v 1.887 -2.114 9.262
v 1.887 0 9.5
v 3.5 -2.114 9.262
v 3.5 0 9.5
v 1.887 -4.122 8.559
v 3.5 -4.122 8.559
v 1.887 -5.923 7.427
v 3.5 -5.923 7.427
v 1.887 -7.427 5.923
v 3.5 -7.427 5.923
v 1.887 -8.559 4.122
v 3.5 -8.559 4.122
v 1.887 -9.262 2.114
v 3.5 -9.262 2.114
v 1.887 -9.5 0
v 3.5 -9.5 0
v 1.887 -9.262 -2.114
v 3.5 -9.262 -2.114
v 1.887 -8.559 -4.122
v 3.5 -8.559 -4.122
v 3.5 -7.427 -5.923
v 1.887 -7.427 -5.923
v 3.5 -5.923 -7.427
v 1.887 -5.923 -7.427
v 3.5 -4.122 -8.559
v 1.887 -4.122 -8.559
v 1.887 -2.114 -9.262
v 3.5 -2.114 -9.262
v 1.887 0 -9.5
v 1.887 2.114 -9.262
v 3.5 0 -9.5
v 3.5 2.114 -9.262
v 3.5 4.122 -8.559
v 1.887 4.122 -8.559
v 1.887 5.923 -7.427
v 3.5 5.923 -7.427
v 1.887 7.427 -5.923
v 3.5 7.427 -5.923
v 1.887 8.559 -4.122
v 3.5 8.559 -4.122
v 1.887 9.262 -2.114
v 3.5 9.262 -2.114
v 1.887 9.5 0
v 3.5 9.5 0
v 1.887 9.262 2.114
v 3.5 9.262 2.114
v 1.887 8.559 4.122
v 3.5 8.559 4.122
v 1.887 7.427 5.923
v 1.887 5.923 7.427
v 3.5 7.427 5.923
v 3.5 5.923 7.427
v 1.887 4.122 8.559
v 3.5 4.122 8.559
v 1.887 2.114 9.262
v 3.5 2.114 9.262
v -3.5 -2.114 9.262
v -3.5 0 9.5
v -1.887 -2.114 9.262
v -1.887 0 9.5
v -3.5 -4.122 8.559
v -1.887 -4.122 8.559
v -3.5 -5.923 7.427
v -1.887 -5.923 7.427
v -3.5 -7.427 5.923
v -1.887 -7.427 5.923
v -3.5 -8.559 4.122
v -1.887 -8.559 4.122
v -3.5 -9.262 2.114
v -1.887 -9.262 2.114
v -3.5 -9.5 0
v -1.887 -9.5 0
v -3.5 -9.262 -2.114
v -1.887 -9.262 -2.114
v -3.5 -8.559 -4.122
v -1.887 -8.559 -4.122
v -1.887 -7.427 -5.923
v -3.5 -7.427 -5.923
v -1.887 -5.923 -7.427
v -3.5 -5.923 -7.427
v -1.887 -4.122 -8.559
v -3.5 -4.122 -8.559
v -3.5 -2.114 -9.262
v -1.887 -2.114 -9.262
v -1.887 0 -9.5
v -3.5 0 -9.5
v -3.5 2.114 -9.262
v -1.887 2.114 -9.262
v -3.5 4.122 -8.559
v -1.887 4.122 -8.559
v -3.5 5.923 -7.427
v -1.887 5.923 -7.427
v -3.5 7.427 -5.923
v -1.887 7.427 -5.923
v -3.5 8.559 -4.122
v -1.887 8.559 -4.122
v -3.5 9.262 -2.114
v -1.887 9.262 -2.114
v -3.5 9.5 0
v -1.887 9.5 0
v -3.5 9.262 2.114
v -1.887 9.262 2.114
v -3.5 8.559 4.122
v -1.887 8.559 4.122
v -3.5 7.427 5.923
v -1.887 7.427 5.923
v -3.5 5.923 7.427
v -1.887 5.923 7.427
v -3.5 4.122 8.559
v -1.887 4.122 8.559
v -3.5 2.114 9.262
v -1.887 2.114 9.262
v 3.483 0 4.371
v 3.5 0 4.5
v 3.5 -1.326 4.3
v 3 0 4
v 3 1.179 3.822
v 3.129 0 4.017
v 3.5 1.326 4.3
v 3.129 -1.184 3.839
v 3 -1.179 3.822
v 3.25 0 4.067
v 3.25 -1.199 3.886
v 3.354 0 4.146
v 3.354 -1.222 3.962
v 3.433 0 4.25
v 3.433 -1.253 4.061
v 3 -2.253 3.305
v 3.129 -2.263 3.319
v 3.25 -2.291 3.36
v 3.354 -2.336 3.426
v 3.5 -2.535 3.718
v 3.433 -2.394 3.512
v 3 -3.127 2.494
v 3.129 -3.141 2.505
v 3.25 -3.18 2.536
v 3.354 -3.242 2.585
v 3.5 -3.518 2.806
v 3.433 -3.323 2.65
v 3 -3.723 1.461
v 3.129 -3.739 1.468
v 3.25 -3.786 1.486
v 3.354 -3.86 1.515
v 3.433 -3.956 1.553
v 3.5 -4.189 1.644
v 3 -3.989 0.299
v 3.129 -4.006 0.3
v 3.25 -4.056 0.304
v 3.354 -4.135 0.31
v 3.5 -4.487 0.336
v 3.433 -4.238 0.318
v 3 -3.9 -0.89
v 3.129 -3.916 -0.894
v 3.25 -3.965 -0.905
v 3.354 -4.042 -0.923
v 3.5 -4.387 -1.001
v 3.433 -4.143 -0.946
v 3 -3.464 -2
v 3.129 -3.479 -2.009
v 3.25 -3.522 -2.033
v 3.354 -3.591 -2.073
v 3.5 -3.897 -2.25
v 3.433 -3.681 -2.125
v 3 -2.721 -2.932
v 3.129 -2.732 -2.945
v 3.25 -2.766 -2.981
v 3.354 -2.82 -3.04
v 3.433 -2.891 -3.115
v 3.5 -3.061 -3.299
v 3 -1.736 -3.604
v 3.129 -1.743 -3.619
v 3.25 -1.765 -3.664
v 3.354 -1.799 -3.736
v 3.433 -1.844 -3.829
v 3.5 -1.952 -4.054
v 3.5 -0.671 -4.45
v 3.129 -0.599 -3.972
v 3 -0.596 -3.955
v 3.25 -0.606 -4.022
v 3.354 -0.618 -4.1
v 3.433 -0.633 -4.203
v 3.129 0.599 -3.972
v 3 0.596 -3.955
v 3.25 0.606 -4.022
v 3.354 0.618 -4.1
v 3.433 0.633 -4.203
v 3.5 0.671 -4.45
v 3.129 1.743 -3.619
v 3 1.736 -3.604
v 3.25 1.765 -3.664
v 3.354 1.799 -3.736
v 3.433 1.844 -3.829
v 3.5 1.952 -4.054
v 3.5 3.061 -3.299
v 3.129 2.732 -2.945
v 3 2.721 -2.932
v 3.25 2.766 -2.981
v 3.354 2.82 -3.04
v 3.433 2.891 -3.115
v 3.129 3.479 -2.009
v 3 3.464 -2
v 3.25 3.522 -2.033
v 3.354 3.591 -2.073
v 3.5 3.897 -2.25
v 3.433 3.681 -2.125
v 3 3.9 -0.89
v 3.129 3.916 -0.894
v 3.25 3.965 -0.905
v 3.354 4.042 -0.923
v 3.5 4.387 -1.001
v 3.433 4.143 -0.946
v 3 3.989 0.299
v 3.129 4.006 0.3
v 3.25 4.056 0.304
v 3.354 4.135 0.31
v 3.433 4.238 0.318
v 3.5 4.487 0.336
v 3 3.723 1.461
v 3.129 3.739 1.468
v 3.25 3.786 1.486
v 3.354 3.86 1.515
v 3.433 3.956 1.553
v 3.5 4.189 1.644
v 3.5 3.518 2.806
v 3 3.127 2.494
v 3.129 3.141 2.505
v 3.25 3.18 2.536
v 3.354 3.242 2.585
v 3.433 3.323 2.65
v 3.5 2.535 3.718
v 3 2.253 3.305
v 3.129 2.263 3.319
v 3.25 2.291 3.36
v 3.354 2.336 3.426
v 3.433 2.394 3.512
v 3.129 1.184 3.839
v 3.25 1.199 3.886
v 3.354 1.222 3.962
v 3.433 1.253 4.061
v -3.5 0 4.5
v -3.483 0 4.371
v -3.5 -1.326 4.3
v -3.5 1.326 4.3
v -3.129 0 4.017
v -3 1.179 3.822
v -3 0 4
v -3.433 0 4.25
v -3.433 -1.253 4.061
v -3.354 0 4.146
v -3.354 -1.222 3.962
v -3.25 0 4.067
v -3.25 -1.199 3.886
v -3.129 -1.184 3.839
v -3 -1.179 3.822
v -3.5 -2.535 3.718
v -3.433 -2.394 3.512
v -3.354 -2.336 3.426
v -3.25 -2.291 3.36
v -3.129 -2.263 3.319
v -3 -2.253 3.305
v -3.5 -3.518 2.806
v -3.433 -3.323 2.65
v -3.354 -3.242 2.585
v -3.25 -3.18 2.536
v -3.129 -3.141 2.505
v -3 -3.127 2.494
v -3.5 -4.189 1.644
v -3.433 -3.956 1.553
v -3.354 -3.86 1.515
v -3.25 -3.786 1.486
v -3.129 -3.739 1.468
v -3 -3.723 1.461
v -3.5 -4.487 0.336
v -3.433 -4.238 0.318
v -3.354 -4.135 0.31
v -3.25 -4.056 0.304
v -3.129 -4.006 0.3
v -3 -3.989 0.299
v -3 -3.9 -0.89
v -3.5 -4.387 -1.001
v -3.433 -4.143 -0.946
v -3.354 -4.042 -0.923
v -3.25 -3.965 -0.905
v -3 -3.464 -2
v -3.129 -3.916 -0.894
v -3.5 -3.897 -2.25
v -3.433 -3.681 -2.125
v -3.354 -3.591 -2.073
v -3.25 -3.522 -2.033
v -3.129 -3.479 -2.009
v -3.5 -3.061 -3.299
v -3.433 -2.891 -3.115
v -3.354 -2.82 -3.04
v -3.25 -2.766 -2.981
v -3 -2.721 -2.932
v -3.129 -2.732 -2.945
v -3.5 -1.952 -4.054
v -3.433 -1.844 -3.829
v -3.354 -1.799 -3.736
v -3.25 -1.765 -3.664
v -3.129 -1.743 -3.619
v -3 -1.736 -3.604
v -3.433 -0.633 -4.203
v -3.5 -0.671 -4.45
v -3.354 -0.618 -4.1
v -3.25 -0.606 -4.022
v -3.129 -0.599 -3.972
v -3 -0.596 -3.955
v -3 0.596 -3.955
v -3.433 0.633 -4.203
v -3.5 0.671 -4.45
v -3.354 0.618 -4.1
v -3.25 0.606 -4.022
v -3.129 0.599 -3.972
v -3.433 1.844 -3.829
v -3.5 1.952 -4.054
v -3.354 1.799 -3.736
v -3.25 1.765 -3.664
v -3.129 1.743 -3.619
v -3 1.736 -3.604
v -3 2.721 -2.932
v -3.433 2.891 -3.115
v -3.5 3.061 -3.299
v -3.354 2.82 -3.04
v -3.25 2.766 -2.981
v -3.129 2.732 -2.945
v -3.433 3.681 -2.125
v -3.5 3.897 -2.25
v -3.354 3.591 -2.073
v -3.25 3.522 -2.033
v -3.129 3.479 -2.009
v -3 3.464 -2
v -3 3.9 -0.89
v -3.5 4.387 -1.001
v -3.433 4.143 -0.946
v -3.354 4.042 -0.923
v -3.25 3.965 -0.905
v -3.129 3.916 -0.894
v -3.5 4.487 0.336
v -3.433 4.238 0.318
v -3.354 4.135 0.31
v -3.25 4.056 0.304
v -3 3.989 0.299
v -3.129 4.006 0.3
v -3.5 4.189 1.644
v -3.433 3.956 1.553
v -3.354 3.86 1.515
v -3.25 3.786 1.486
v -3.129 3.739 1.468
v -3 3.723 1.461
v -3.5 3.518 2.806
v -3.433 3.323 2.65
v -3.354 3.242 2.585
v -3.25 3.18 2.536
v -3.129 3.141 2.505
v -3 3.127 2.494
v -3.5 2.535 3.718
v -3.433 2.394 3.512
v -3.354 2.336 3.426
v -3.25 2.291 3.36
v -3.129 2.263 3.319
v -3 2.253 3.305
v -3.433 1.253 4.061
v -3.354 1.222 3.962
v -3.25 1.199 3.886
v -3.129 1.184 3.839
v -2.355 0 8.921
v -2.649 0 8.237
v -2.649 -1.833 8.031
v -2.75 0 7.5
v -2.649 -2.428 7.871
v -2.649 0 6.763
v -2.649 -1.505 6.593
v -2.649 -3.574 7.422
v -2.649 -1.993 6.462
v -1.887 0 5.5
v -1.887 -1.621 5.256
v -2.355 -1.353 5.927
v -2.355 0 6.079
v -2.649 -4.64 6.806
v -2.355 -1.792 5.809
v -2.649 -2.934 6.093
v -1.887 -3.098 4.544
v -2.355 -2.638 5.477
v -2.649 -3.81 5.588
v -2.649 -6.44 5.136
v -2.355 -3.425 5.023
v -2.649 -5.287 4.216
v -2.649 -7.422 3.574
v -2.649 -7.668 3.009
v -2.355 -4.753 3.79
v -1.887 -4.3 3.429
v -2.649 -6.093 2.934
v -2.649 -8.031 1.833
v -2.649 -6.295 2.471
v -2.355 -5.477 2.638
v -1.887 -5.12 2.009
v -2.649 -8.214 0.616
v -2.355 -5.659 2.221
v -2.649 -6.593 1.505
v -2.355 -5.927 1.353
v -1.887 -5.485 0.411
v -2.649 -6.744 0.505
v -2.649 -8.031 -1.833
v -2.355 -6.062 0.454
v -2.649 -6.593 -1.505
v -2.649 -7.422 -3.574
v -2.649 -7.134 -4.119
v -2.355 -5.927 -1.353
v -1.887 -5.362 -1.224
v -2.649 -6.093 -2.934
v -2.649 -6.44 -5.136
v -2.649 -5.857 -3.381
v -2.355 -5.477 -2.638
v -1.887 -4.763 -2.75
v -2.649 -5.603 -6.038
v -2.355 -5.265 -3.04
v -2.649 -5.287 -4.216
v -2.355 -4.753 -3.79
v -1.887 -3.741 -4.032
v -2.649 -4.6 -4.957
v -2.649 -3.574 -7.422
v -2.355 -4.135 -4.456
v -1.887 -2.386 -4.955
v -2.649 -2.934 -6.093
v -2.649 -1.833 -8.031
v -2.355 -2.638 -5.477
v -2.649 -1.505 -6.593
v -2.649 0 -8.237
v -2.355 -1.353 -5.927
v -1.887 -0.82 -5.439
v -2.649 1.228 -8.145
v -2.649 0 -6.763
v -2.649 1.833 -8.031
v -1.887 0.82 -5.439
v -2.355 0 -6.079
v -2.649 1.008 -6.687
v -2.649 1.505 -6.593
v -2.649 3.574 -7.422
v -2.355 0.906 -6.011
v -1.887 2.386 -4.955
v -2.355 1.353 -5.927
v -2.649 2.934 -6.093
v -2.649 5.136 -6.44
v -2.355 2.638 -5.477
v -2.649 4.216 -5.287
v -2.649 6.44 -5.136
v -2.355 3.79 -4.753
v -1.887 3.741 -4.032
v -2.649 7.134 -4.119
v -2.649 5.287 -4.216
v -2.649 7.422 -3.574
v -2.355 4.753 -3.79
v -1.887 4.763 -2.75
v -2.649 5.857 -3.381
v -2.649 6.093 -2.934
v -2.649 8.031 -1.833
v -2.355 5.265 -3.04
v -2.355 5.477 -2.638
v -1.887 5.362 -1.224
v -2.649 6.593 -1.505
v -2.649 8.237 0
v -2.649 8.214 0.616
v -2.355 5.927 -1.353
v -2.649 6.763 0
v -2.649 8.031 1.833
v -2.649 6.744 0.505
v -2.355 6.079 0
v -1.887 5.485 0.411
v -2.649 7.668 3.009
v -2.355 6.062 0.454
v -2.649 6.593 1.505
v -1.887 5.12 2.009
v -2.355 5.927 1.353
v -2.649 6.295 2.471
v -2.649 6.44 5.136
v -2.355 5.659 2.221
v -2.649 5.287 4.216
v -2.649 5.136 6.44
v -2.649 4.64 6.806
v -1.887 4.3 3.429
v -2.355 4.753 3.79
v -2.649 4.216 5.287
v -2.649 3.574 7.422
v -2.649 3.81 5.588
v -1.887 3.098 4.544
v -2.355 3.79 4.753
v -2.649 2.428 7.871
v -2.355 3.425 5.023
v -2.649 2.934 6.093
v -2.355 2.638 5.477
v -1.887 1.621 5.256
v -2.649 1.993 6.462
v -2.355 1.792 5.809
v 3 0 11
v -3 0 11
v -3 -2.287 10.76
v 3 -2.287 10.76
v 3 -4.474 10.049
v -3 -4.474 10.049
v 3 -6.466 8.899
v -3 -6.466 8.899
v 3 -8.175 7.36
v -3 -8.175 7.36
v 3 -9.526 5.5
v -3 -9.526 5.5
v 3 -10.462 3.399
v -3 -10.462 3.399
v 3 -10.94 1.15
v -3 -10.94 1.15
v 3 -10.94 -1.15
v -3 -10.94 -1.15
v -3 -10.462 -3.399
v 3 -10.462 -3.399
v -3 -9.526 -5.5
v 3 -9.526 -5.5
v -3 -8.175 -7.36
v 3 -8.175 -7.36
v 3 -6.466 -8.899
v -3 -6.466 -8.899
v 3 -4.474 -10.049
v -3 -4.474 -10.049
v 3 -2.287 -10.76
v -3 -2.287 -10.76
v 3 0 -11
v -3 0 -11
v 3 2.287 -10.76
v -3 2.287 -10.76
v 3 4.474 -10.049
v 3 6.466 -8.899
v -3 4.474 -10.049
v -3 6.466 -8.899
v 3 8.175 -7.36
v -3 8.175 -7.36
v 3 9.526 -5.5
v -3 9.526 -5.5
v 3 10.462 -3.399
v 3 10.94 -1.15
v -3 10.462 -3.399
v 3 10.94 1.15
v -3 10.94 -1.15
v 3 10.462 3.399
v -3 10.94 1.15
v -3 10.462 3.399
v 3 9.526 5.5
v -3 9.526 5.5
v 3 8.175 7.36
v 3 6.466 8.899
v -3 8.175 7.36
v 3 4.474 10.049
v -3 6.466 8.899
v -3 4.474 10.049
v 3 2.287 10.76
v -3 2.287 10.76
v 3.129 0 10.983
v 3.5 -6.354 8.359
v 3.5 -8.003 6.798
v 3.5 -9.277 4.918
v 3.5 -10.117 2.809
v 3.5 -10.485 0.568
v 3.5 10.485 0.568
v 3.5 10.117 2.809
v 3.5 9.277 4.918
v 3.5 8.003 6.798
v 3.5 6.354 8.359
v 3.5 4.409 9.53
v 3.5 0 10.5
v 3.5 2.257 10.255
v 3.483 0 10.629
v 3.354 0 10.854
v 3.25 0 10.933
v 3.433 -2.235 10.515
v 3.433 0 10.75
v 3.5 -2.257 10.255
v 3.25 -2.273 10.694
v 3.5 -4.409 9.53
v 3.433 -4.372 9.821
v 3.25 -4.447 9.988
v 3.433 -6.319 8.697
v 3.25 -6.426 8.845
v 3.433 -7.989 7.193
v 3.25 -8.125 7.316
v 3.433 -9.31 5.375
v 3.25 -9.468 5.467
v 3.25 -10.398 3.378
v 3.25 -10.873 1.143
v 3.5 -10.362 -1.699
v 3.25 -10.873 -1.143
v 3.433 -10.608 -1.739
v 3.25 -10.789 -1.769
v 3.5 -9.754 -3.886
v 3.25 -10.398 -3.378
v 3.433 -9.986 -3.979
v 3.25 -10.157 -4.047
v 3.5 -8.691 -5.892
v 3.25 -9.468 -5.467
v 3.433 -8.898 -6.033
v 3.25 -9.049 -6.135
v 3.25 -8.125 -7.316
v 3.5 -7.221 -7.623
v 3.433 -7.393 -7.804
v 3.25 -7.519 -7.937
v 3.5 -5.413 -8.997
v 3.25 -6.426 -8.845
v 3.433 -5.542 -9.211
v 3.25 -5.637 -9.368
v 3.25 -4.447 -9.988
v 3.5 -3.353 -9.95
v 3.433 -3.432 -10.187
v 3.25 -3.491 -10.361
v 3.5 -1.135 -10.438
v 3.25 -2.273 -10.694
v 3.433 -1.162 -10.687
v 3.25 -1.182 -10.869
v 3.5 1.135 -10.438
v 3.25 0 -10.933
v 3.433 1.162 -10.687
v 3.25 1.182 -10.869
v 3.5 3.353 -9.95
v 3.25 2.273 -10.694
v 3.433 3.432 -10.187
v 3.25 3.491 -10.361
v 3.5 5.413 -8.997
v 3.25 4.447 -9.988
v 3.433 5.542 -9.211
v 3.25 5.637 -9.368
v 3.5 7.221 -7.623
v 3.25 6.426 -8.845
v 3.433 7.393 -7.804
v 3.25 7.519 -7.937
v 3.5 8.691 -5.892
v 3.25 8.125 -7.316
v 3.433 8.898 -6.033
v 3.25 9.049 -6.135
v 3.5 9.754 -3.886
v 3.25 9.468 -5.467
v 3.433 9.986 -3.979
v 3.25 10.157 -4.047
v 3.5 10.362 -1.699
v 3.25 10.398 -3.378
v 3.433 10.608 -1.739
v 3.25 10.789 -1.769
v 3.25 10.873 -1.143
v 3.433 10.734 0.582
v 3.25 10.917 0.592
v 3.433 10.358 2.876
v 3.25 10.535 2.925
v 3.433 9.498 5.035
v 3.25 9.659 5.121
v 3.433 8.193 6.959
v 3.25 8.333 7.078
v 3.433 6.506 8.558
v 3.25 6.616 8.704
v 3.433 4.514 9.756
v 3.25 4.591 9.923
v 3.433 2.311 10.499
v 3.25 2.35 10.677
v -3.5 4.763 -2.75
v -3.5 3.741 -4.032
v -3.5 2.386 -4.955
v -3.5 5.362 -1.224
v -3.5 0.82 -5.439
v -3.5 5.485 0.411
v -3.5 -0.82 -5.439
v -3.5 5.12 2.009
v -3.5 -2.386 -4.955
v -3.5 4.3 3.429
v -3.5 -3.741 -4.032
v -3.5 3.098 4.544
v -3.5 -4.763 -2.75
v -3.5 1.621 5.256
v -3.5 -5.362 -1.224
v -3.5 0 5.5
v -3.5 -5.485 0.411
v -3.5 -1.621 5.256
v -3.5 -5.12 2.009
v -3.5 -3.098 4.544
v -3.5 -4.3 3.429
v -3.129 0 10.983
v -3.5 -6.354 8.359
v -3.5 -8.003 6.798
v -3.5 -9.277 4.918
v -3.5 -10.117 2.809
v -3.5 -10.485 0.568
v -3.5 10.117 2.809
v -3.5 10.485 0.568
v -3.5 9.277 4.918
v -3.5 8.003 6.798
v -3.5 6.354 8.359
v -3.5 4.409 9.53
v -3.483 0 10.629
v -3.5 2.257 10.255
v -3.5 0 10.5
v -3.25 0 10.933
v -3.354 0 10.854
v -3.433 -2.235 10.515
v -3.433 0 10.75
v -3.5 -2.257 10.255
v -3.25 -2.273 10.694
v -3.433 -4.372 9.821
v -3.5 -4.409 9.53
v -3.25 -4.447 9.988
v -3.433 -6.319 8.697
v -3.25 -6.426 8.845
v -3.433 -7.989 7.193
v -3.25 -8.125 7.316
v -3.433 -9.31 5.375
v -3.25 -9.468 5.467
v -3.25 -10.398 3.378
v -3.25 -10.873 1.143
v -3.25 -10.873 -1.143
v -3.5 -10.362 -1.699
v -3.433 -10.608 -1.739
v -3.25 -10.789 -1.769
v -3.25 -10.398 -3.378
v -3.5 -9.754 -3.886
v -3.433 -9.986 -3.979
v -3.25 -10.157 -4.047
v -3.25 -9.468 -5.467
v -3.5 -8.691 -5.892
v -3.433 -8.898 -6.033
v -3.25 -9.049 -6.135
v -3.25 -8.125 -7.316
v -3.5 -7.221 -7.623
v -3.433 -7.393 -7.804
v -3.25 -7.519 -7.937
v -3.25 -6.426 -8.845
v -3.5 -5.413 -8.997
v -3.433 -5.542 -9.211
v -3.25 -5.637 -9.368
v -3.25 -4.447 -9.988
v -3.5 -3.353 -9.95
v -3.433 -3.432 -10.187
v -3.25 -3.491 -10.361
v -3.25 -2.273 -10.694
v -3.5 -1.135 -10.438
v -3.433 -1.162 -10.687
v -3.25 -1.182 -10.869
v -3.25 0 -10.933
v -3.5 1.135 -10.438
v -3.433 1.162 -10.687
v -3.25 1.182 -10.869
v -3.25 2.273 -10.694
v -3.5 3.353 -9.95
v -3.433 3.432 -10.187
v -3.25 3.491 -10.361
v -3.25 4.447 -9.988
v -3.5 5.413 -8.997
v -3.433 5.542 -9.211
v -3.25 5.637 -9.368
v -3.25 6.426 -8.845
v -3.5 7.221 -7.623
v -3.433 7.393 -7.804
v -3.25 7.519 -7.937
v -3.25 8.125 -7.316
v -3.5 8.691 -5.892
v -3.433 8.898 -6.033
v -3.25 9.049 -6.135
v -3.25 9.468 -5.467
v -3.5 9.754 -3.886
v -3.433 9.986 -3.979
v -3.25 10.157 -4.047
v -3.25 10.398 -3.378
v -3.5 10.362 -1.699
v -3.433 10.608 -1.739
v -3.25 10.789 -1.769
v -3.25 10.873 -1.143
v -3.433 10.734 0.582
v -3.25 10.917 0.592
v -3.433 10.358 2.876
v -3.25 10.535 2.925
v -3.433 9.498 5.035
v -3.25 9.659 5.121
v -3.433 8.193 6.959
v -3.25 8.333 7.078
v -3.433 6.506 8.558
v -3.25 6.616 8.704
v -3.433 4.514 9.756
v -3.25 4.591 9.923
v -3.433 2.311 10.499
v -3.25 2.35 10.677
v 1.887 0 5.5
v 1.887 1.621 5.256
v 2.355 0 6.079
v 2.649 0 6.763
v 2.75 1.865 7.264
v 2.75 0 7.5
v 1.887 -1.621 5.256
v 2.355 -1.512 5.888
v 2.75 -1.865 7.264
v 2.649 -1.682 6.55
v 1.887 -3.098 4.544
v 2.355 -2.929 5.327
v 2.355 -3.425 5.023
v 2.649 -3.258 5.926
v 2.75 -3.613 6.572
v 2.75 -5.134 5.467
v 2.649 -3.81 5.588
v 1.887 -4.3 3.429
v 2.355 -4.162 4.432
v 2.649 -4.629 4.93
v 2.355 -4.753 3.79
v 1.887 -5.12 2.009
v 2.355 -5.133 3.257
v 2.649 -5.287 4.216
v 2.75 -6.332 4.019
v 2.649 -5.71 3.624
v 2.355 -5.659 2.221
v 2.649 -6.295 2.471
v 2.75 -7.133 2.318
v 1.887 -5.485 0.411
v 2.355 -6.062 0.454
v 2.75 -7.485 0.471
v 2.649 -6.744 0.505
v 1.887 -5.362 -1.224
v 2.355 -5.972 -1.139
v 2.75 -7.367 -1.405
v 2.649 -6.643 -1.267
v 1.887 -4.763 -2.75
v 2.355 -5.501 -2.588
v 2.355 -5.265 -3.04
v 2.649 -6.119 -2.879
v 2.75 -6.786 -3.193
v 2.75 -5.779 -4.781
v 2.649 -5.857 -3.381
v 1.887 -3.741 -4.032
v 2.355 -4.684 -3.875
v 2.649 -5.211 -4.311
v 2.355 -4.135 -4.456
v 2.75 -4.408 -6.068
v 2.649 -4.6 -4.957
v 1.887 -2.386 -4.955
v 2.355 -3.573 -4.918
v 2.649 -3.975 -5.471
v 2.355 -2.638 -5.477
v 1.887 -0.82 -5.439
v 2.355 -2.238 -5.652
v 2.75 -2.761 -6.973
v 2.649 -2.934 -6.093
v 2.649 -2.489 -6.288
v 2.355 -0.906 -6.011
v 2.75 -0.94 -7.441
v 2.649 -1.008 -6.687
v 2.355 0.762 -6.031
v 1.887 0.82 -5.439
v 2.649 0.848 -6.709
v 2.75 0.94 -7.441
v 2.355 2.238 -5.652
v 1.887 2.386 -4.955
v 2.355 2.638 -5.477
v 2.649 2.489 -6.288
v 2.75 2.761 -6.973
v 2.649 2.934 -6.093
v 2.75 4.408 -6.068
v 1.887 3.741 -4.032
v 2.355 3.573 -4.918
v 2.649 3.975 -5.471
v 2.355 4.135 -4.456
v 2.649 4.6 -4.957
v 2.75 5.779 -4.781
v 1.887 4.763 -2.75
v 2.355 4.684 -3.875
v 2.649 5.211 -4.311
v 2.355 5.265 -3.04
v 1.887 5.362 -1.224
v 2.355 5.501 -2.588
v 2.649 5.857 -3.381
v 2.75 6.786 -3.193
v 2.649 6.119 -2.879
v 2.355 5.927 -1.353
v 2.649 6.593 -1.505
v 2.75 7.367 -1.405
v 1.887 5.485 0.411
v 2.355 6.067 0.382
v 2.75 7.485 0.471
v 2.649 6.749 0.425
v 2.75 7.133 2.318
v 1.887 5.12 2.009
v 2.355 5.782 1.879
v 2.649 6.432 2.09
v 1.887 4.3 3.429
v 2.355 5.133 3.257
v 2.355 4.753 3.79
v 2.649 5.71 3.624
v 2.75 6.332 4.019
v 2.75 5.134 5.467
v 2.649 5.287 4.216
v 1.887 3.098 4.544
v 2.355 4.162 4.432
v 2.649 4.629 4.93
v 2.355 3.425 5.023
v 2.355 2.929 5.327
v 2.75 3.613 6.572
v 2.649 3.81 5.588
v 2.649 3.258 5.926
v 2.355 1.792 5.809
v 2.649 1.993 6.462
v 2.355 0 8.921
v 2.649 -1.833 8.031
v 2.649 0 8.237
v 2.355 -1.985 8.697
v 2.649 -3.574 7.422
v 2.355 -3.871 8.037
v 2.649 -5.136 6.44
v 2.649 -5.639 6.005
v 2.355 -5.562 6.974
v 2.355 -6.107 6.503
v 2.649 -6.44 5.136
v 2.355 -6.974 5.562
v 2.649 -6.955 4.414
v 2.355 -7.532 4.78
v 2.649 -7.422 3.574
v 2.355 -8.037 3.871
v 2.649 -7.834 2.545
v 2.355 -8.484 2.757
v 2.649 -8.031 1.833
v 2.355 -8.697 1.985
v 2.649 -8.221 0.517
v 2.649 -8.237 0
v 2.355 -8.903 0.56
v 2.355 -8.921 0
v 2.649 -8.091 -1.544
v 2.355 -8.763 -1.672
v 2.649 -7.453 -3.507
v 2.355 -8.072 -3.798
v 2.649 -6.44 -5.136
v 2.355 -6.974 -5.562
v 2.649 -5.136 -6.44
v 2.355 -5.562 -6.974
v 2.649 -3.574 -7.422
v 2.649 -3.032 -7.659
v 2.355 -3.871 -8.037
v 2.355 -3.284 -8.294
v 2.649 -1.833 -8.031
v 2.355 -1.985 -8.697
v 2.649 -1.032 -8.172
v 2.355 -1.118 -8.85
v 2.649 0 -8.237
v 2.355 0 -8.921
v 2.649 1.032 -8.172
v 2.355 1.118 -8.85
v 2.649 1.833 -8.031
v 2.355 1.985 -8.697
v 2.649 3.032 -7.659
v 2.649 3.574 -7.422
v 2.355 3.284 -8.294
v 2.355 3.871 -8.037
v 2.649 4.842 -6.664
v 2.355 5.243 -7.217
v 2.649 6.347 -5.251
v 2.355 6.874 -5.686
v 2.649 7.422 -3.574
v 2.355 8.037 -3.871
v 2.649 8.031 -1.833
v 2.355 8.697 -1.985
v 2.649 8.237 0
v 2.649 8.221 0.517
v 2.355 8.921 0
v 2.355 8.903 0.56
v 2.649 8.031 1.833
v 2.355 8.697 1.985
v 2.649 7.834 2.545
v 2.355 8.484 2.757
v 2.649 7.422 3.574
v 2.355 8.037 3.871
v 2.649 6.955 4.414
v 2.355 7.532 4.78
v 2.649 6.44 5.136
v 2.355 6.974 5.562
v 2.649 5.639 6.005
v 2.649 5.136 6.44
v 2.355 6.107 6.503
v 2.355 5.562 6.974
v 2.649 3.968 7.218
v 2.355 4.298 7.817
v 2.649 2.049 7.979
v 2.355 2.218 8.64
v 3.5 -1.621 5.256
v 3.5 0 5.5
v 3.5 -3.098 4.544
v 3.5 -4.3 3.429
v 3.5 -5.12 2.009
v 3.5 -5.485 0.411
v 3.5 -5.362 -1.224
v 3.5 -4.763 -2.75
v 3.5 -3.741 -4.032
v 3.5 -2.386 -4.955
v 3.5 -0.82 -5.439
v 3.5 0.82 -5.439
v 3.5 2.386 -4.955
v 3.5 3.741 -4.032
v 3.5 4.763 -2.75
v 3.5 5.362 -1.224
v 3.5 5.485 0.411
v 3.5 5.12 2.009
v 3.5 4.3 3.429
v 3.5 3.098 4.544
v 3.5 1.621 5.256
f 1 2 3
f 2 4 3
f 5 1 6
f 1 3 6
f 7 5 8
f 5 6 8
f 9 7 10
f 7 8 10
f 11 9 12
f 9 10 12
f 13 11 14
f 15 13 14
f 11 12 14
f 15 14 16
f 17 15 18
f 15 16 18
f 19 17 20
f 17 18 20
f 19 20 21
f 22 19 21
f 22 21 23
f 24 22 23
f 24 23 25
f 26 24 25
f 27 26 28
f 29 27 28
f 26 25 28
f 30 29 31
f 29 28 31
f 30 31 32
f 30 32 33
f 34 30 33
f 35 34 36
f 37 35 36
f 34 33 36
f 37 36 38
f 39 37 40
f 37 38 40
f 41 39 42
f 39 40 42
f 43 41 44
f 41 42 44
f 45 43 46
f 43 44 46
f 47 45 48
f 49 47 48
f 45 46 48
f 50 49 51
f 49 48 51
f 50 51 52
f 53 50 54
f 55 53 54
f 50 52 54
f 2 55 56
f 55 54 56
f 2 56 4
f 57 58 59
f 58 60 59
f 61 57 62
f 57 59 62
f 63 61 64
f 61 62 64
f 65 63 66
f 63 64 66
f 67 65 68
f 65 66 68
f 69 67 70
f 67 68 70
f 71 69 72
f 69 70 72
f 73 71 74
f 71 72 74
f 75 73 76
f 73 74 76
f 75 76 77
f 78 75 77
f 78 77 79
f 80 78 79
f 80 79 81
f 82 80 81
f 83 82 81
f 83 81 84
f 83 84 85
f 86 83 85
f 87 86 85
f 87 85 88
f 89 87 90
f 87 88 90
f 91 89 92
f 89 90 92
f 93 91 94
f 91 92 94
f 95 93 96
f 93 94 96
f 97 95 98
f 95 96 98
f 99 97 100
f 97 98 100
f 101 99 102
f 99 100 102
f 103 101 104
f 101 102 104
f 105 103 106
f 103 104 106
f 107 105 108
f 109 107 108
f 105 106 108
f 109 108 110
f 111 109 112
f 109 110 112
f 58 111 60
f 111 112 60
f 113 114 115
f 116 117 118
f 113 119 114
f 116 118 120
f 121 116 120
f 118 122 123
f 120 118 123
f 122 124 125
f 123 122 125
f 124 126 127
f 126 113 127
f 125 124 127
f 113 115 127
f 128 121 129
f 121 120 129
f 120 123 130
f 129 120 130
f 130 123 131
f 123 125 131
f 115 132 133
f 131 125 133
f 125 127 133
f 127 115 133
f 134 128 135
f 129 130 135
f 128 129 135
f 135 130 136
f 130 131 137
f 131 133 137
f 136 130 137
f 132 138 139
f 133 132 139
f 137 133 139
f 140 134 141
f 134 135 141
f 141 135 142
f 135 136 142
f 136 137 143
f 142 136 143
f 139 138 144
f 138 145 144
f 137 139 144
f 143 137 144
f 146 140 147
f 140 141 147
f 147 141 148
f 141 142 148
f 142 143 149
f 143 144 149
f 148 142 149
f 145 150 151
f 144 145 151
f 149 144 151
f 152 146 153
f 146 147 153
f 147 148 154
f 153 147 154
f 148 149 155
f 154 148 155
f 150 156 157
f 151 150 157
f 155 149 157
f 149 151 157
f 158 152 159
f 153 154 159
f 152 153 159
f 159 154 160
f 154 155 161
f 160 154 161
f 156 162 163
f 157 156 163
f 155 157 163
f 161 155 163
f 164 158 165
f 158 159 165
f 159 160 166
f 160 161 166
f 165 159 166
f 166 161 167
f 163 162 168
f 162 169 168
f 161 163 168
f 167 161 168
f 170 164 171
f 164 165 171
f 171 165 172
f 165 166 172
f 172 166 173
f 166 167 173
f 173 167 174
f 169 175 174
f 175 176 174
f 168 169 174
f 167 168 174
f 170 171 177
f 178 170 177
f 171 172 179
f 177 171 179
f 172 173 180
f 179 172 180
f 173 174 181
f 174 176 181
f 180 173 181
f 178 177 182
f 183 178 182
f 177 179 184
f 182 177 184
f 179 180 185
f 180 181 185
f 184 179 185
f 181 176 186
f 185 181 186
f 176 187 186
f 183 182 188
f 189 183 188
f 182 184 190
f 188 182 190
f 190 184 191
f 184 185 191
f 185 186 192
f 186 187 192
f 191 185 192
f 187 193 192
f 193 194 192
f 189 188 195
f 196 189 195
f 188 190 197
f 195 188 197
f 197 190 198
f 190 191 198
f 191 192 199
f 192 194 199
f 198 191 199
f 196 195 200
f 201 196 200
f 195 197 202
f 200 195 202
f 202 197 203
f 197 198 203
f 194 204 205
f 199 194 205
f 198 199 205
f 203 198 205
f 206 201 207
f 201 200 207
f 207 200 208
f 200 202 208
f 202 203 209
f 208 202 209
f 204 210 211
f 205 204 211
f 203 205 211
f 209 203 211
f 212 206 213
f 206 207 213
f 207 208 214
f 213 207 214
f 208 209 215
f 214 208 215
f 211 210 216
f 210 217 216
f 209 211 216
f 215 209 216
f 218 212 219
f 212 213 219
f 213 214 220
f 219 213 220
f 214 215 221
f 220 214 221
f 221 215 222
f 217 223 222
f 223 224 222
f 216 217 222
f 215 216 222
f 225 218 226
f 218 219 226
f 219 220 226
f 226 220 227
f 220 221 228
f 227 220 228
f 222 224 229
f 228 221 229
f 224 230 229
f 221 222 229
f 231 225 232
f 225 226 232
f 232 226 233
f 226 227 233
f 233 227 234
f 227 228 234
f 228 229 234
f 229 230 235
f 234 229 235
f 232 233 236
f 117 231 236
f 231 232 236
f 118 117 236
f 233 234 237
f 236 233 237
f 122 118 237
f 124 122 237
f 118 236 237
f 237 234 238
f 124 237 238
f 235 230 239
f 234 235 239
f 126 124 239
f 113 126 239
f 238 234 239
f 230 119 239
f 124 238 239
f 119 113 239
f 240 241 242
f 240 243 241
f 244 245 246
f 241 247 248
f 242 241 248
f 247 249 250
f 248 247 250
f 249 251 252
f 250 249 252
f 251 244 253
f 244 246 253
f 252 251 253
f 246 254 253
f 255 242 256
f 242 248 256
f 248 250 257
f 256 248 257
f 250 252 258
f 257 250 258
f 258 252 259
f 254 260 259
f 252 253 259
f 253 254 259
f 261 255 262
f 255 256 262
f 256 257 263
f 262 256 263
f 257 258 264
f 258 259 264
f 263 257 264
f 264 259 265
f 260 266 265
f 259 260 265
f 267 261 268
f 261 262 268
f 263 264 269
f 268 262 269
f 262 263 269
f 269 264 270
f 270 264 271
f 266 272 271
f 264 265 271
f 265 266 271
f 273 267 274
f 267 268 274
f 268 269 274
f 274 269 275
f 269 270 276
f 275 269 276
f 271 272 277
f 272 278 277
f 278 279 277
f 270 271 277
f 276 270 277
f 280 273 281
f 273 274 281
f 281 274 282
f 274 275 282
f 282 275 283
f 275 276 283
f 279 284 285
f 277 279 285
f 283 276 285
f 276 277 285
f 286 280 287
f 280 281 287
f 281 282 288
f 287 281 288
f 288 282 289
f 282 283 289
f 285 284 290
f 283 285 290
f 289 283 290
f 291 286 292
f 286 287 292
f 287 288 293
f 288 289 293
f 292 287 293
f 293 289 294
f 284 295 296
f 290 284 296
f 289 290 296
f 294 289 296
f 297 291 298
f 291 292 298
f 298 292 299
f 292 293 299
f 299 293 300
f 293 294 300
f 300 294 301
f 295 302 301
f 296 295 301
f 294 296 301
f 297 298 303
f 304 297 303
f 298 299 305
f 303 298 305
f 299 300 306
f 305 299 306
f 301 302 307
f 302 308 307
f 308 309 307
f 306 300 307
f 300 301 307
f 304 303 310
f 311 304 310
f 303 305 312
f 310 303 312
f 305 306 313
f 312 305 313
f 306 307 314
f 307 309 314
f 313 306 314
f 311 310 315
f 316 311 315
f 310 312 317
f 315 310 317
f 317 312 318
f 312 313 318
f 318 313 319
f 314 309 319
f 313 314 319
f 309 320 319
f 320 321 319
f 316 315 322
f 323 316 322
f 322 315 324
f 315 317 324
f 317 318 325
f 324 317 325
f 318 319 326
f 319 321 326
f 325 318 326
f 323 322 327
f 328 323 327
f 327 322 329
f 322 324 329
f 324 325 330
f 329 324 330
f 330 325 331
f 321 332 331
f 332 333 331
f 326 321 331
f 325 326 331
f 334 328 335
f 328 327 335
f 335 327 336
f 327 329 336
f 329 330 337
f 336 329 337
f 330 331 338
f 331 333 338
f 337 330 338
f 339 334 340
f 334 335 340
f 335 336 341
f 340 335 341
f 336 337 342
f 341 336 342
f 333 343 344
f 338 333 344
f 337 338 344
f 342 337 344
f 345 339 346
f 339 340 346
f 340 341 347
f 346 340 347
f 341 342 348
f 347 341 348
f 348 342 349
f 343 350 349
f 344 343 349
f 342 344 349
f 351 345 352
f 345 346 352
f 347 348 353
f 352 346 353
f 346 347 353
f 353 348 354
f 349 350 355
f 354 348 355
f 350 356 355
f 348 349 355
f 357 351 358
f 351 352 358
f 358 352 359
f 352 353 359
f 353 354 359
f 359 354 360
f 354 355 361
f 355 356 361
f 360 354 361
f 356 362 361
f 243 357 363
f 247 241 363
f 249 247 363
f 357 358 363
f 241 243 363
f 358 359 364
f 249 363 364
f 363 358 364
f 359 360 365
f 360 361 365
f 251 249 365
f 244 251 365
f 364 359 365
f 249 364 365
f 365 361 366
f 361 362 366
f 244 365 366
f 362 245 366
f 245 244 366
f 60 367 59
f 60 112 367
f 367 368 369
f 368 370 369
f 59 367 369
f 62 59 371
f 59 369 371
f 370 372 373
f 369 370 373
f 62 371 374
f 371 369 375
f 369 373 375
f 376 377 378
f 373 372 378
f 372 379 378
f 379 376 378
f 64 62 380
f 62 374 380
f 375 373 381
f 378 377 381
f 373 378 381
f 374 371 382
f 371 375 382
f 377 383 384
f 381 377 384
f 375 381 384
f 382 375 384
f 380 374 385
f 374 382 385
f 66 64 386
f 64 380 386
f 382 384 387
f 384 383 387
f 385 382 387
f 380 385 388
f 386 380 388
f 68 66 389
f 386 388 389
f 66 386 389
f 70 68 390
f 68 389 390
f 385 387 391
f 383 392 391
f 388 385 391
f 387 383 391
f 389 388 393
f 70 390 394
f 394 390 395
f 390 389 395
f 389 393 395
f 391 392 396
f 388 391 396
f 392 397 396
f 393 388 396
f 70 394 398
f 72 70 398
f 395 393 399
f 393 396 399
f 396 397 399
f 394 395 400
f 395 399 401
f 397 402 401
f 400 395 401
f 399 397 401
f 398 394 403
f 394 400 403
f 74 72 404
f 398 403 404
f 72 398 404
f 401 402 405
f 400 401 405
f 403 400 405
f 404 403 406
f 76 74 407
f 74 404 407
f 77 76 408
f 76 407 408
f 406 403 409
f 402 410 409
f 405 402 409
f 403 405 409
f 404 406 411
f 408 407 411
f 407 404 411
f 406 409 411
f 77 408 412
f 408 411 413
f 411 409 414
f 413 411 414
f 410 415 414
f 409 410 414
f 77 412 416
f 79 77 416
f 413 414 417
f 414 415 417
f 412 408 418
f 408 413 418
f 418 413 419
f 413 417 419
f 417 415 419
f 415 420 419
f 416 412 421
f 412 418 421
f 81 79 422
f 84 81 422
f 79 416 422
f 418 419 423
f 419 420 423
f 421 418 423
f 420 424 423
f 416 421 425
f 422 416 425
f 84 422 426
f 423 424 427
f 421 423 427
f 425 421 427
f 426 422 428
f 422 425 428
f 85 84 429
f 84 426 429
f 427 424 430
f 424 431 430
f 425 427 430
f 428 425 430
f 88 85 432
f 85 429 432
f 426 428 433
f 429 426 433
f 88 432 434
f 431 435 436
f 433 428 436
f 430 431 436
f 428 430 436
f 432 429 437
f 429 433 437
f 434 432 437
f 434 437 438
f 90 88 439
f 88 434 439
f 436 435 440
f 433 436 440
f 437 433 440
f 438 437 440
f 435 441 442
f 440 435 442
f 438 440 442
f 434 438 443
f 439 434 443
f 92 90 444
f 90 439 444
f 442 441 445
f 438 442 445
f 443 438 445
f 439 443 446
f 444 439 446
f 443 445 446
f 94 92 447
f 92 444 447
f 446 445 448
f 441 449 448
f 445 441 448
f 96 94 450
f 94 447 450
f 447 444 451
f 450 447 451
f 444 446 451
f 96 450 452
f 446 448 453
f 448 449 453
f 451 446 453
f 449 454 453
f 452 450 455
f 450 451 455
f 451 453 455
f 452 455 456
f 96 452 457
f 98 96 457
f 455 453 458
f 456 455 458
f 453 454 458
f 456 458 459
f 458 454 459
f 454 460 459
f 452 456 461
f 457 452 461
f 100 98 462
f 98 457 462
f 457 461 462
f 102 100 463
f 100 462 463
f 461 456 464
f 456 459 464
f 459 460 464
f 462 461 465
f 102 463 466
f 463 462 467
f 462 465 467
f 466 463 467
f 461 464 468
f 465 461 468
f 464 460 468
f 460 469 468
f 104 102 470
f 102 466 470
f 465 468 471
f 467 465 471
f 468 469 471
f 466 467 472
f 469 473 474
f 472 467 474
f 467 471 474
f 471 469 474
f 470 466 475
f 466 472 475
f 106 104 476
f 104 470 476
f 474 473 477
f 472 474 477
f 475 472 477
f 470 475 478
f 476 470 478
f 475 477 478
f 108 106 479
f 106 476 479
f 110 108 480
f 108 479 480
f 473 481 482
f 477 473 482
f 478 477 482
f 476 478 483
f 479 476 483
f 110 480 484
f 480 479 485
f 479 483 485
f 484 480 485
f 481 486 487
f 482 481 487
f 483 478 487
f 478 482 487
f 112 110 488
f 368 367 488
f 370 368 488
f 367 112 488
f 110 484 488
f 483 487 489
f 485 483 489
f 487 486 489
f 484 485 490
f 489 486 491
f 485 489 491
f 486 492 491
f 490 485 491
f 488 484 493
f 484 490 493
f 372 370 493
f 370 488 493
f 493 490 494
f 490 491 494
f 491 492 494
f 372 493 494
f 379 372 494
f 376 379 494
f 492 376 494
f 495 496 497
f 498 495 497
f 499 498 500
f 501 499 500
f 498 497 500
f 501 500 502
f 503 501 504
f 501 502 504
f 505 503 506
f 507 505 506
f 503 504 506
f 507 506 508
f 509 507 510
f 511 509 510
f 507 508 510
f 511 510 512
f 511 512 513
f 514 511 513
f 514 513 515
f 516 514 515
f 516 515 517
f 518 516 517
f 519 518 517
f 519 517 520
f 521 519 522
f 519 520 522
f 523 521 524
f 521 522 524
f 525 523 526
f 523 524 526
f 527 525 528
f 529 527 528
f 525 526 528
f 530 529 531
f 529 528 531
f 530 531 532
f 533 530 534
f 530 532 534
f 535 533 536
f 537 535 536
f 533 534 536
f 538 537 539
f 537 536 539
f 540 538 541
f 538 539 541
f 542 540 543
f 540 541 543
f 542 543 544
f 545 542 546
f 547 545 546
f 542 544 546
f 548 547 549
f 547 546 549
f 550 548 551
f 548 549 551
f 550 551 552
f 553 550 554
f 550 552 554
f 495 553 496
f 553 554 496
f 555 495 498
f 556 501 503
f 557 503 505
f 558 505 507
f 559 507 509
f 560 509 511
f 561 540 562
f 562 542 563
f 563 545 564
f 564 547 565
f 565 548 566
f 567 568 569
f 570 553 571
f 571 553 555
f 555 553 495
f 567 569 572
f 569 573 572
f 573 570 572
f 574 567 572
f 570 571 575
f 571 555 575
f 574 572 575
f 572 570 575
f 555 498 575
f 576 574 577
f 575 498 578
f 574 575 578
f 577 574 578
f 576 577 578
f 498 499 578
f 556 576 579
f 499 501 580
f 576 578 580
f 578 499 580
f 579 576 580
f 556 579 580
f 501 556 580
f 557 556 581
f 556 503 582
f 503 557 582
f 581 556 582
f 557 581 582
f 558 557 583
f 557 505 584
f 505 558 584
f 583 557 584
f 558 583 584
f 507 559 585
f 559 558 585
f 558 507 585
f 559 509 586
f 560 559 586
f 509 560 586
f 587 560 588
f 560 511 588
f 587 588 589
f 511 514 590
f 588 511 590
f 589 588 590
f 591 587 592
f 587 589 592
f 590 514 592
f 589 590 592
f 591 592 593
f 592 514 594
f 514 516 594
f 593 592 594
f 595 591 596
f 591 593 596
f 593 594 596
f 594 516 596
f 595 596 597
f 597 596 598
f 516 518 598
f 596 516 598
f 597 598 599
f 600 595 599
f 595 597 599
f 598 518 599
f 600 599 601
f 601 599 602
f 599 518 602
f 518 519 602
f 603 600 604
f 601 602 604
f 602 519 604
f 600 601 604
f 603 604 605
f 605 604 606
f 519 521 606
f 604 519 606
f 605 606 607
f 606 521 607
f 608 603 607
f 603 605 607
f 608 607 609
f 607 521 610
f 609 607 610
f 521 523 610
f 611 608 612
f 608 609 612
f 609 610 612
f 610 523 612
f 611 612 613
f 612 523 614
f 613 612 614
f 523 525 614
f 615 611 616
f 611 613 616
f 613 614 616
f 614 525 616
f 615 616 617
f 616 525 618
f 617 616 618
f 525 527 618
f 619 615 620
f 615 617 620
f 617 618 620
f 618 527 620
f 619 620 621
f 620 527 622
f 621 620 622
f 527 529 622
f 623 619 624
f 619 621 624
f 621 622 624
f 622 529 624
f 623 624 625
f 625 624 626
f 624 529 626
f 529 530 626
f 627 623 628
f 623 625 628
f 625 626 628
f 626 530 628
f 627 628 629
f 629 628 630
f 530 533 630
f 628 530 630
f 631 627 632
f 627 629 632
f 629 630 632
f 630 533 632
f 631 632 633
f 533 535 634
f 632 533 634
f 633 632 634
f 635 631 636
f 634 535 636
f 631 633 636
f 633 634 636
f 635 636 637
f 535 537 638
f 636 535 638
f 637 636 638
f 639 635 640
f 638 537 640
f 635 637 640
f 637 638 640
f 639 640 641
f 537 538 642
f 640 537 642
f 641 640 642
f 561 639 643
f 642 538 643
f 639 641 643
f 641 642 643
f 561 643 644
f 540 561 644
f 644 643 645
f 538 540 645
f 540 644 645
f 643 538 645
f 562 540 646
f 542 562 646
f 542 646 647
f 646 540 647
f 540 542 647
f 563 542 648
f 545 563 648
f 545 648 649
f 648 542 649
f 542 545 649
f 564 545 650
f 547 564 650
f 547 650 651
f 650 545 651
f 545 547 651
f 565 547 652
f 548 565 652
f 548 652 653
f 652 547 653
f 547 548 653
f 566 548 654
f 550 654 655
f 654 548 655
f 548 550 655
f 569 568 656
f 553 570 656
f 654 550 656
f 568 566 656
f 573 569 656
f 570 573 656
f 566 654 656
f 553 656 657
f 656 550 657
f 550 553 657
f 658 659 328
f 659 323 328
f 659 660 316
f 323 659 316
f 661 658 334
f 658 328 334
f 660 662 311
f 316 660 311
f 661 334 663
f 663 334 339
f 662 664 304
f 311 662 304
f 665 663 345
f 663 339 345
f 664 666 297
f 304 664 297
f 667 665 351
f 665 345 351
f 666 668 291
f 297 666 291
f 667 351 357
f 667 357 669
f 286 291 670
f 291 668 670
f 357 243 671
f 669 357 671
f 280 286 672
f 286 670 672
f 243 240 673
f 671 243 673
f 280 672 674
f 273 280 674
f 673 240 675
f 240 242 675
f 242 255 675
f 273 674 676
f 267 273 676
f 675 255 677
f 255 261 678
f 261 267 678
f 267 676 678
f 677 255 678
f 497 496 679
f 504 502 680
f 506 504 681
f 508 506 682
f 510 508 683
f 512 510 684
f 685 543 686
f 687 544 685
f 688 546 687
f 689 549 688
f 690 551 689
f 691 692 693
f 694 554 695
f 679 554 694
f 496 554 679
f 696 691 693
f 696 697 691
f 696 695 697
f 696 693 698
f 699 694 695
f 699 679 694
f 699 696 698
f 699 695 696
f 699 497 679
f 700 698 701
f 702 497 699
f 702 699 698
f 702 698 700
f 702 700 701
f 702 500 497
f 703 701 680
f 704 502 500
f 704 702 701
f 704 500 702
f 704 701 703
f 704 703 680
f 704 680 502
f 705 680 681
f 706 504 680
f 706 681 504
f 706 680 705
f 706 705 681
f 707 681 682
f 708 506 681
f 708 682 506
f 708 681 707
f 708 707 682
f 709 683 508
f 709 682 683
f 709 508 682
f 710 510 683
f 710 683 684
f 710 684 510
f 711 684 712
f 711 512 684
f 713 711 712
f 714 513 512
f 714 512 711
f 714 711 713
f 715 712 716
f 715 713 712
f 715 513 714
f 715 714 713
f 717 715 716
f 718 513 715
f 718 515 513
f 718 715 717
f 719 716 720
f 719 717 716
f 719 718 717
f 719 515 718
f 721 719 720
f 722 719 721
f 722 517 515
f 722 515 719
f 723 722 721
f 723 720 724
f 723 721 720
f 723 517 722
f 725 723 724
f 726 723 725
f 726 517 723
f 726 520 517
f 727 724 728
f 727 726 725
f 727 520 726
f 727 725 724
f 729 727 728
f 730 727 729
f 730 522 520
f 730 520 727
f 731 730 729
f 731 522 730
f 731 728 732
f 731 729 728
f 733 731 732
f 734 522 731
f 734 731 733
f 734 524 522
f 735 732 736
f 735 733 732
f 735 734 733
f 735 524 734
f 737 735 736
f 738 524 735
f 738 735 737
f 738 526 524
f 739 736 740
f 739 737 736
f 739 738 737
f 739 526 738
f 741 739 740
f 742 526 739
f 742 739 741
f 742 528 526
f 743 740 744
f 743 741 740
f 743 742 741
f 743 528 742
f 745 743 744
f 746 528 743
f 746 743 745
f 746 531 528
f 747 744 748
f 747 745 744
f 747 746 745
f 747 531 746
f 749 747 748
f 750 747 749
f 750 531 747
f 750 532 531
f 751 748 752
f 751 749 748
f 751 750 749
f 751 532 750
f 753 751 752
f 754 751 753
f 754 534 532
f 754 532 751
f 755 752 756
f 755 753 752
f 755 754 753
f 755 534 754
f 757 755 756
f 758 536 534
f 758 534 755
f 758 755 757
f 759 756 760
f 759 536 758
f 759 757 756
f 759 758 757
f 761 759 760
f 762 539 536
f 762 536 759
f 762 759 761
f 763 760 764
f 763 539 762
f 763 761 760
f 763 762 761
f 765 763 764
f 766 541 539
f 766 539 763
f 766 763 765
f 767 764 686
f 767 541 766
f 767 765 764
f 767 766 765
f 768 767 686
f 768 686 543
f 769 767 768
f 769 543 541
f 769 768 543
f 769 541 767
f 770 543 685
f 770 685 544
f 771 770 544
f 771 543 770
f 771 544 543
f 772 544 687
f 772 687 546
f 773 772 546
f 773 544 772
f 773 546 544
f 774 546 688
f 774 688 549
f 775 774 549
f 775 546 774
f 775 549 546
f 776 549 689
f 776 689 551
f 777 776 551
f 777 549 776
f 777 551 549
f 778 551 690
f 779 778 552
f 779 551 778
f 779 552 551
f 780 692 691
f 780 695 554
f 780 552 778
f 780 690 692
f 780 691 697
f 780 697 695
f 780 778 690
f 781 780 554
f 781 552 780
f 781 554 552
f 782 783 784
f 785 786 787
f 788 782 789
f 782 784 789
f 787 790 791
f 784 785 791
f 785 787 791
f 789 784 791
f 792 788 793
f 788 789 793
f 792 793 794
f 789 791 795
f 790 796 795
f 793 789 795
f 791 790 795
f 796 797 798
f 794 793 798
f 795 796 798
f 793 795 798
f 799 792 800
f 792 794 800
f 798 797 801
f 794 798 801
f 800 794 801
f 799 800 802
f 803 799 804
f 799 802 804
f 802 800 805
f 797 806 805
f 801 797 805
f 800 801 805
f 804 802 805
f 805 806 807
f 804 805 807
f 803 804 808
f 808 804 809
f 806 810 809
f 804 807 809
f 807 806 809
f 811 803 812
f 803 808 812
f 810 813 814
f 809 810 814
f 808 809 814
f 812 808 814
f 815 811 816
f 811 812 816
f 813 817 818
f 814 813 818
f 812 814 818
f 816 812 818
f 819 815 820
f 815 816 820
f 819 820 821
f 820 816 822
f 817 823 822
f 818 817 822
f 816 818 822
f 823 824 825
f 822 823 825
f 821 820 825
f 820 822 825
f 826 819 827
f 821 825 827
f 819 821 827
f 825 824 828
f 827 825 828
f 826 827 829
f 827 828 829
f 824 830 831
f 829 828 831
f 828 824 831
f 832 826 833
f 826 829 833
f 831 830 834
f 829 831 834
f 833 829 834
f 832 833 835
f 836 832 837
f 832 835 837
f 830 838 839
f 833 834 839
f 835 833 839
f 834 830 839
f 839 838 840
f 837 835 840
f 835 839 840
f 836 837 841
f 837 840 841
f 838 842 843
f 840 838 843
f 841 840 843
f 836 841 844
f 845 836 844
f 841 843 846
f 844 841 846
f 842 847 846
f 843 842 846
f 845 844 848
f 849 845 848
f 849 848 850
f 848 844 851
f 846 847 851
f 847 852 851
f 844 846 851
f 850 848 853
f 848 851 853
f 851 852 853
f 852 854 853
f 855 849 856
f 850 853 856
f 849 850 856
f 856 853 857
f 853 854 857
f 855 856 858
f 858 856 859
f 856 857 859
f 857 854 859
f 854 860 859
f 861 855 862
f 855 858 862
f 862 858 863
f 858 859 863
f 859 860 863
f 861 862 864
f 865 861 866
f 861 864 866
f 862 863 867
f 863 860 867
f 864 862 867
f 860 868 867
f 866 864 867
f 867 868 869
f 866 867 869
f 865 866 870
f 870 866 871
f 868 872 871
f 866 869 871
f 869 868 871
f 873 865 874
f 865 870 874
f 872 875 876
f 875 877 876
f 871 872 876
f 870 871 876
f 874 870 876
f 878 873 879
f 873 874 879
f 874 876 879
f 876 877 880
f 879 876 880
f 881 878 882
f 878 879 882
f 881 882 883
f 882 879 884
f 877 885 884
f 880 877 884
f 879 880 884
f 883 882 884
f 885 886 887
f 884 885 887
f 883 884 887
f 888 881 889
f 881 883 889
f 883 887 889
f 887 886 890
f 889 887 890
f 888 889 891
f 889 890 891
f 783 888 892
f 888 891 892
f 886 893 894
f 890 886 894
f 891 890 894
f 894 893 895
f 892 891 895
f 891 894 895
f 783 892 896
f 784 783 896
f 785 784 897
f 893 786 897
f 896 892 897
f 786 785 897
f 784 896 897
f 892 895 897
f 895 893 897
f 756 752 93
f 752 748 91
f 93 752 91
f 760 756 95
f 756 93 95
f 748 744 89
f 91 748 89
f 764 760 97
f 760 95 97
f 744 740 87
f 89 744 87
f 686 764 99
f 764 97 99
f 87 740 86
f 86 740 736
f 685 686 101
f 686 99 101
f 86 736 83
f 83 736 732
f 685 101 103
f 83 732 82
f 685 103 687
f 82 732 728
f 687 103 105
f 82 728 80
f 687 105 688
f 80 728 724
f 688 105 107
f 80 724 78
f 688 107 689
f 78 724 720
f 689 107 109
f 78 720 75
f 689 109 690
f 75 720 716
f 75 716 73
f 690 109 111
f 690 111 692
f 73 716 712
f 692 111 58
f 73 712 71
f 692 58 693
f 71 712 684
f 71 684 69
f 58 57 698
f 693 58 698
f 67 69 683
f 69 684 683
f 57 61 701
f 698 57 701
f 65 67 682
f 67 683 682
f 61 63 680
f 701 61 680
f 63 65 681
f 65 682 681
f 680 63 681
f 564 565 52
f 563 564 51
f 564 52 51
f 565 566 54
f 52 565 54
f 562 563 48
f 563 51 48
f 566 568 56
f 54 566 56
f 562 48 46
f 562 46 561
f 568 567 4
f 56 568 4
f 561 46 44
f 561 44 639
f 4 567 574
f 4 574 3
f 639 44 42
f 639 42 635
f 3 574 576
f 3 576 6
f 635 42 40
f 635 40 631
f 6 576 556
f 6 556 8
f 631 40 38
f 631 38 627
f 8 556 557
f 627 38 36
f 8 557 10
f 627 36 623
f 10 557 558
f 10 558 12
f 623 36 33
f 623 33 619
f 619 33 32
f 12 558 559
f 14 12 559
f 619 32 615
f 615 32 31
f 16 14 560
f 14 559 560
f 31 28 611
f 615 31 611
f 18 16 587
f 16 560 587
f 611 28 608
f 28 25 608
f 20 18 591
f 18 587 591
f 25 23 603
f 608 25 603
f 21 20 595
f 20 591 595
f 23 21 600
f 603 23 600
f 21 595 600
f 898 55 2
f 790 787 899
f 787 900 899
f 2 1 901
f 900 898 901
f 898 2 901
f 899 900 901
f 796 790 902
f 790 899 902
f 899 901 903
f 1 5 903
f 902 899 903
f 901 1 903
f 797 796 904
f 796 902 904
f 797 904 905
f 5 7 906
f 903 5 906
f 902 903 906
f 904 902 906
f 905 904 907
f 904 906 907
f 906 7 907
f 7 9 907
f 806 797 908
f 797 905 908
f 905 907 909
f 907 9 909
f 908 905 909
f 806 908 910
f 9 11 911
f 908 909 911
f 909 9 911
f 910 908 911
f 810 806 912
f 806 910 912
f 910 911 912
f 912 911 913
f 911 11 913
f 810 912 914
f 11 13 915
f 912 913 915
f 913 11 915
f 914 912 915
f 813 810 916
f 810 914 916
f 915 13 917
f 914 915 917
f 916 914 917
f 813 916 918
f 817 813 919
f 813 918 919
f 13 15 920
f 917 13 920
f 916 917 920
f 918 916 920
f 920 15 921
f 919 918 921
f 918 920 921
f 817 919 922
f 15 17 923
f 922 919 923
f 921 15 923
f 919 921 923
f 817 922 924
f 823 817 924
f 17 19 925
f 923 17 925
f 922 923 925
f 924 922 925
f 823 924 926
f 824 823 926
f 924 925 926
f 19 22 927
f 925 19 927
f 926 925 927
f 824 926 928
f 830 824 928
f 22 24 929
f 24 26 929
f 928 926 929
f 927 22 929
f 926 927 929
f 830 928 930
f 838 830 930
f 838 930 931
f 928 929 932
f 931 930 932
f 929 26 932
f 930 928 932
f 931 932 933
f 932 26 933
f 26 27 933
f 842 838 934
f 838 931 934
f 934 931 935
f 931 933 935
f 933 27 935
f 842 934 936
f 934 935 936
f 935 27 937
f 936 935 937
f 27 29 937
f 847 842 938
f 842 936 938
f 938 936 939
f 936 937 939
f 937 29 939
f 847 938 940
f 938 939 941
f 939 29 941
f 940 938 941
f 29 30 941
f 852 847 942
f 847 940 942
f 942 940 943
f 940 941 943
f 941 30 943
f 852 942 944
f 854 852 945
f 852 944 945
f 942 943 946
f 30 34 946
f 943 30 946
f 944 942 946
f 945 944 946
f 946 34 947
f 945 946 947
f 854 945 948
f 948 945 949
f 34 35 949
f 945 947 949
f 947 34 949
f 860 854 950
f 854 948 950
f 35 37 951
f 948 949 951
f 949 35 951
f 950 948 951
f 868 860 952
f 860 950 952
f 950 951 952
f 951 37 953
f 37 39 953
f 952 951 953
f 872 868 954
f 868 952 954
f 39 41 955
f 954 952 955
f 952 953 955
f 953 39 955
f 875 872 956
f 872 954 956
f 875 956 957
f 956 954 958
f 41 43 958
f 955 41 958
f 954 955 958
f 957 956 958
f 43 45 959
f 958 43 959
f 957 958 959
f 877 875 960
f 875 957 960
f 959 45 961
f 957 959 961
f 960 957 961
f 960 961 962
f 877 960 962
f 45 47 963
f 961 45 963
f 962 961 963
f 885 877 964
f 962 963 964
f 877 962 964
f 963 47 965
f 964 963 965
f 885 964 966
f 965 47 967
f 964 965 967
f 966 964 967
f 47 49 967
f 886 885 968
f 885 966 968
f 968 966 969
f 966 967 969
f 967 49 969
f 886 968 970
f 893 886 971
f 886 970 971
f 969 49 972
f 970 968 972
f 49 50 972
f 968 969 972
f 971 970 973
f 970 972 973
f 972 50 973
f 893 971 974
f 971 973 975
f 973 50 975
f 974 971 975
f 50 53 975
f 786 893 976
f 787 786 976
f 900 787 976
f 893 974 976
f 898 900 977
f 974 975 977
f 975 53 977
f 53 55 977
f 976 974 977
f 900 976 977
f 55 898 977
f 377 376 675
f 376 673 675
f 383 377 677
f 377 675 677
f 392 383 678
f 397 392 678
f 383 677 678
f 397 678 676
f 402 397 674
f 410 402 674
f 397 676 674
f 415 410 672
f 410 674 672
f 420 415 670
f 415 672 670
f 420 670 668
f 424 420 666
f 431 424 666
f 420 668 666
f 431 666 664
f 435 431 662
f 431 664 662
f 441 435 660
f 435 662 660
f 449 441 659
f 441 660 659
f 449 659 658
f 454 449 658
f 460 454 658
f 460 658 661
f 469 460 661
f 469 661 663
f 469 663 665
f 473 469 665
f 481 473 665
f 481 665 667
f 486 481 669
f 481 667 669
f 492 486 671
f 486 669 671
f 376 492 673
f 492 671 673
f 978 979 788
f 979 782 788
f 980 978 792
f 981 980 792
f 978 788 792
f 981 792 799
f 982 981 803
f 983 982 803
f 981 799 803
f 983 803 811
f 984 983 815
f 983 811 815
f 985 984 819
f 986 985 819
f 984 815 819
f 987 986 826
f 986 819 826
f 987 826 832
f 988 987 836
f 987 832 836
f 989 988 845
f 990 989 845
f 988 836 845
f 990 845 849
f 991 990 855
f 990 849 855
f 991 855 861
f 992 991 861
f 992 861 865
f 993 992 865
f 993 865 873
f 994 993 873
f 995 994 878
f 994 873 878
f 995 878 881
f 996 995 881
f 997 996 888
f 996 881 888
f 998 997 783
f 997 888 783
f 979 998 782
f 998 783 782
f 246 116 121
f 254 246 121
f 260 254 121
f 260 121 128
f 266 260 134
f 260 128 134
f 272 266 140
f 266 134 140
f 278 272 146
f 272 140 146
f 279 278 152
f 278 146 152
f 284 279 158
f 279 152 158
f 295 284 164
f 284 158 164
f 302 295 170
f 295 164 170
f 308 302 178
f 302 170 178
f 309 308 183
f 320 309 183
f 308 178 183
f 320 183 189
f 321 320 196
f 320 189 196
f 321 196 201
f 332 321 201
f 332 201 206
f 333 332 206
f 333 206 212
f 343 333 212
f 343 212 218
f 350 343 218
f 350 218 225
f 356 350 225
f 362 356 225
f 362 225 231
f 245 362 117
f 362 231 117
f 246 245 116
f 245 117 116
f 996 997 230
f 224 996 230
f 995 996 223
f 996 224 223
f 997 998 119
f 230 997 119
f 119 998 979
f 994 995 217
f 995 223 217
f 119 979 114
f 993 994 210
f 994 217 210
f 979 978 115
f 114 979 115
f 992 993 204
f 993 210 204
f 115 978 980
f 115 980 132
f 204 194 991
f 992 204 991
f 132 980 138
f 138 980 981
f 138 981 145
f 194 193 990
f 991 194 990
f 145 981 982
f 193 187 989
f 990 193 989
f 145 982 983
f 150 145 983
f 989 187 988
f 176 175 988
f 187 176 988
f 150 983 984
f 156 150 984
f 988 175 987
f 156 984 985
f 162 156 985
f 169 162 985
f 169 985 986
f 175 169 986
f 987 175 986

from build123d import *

# Parameters (mm, degrees)
FILETE1_R = 0.5


with BuildPart() as part:
    # Esboço1 → Revolução1 (revolve)
    with BuildSketch(Plane.XY, mode=Mode.PRIVATE) as revolu_o1_sk:
        with BuildLine():
            Line((-3.5, 11), (-3.5, 9.5))
            Line((-3.5, 9.5), (-1.887458609, 9.5))
            ThreePointArc((-1.887458609, 9.5), (0, 10.25), (1.887458609, 9.5))
            Line((1.887458609, 9.5), (3.5, 9.5))
            Line((3.5, 9.5), (3.5, 11))
            Line((3.5, 11), (-3.5, 11))
        make_face()
        with BuildLine():
            ThreePointArc((1.887458609, 9.5), (0, 10.25), (-1.887458609, 9.5))
            Line((-1.887458609, 9.5), (1.887458609, 9.5))
        make_face()
        with BuildLine():
            Line((1.887458609, 9.5), (-1.887458609, 9.5))
            ThreePointArc((-1.887458609, 9.5), (-2.75, 7.5), (-1.887458609, 5.5))
            Line((-1.887458609, 5.5), (1.887458609, 5.5))
            ThreePointArc((1.887458609, 5.5), (2.525174368, 6.410966294), (2.75, 7.5))
            ThreePointArc((2.75, 7.5), (2.525174368, 8.589033706), (1.887458609, 9.5))
        make_face()
        with BuildLine():
            Line((1.887458609, 5.5), (-1.887458609, 5.5))
            ThreePointArc((-1.887458609, 5.5), (0, 4.75), (1.887458609, 5.5))
        make_face()
        with BuildLine():
            Line((-1.887458609, 5.5), (-3.5, 5.5))
            Line((-3.5, 5.5), (-3.5, 4))
            Line((-3.5, 4), (3.5, 4))
            Line((3.5, 4), (3.5, 5.5))
            Line((3.5, 5.5), (1.887458609, 5.5))
            ThreePointArc((1.887458609, 5.5), (0, 4.75), (-1.887458609, 5.5))
        make_face()
    revolve(revolu_o1_sk.sketch.rotate(Axis((0, 0, 0), (1, 0, 0)), 90), axis=Axis((0, 0, 0), (1, 0, 0)))

    # Filete1
    filete1_edges = [part.edges().sort_by_distance(p)[0] for p in [
        (-3.5, 0, -11),
        (3.5, 0, -11),
        (3.5, 0, -4),
        (-3.5, 0, -4),
    ]]
    fillet(filete1_edges, radius=FILETE1_R)


solid = part.part
